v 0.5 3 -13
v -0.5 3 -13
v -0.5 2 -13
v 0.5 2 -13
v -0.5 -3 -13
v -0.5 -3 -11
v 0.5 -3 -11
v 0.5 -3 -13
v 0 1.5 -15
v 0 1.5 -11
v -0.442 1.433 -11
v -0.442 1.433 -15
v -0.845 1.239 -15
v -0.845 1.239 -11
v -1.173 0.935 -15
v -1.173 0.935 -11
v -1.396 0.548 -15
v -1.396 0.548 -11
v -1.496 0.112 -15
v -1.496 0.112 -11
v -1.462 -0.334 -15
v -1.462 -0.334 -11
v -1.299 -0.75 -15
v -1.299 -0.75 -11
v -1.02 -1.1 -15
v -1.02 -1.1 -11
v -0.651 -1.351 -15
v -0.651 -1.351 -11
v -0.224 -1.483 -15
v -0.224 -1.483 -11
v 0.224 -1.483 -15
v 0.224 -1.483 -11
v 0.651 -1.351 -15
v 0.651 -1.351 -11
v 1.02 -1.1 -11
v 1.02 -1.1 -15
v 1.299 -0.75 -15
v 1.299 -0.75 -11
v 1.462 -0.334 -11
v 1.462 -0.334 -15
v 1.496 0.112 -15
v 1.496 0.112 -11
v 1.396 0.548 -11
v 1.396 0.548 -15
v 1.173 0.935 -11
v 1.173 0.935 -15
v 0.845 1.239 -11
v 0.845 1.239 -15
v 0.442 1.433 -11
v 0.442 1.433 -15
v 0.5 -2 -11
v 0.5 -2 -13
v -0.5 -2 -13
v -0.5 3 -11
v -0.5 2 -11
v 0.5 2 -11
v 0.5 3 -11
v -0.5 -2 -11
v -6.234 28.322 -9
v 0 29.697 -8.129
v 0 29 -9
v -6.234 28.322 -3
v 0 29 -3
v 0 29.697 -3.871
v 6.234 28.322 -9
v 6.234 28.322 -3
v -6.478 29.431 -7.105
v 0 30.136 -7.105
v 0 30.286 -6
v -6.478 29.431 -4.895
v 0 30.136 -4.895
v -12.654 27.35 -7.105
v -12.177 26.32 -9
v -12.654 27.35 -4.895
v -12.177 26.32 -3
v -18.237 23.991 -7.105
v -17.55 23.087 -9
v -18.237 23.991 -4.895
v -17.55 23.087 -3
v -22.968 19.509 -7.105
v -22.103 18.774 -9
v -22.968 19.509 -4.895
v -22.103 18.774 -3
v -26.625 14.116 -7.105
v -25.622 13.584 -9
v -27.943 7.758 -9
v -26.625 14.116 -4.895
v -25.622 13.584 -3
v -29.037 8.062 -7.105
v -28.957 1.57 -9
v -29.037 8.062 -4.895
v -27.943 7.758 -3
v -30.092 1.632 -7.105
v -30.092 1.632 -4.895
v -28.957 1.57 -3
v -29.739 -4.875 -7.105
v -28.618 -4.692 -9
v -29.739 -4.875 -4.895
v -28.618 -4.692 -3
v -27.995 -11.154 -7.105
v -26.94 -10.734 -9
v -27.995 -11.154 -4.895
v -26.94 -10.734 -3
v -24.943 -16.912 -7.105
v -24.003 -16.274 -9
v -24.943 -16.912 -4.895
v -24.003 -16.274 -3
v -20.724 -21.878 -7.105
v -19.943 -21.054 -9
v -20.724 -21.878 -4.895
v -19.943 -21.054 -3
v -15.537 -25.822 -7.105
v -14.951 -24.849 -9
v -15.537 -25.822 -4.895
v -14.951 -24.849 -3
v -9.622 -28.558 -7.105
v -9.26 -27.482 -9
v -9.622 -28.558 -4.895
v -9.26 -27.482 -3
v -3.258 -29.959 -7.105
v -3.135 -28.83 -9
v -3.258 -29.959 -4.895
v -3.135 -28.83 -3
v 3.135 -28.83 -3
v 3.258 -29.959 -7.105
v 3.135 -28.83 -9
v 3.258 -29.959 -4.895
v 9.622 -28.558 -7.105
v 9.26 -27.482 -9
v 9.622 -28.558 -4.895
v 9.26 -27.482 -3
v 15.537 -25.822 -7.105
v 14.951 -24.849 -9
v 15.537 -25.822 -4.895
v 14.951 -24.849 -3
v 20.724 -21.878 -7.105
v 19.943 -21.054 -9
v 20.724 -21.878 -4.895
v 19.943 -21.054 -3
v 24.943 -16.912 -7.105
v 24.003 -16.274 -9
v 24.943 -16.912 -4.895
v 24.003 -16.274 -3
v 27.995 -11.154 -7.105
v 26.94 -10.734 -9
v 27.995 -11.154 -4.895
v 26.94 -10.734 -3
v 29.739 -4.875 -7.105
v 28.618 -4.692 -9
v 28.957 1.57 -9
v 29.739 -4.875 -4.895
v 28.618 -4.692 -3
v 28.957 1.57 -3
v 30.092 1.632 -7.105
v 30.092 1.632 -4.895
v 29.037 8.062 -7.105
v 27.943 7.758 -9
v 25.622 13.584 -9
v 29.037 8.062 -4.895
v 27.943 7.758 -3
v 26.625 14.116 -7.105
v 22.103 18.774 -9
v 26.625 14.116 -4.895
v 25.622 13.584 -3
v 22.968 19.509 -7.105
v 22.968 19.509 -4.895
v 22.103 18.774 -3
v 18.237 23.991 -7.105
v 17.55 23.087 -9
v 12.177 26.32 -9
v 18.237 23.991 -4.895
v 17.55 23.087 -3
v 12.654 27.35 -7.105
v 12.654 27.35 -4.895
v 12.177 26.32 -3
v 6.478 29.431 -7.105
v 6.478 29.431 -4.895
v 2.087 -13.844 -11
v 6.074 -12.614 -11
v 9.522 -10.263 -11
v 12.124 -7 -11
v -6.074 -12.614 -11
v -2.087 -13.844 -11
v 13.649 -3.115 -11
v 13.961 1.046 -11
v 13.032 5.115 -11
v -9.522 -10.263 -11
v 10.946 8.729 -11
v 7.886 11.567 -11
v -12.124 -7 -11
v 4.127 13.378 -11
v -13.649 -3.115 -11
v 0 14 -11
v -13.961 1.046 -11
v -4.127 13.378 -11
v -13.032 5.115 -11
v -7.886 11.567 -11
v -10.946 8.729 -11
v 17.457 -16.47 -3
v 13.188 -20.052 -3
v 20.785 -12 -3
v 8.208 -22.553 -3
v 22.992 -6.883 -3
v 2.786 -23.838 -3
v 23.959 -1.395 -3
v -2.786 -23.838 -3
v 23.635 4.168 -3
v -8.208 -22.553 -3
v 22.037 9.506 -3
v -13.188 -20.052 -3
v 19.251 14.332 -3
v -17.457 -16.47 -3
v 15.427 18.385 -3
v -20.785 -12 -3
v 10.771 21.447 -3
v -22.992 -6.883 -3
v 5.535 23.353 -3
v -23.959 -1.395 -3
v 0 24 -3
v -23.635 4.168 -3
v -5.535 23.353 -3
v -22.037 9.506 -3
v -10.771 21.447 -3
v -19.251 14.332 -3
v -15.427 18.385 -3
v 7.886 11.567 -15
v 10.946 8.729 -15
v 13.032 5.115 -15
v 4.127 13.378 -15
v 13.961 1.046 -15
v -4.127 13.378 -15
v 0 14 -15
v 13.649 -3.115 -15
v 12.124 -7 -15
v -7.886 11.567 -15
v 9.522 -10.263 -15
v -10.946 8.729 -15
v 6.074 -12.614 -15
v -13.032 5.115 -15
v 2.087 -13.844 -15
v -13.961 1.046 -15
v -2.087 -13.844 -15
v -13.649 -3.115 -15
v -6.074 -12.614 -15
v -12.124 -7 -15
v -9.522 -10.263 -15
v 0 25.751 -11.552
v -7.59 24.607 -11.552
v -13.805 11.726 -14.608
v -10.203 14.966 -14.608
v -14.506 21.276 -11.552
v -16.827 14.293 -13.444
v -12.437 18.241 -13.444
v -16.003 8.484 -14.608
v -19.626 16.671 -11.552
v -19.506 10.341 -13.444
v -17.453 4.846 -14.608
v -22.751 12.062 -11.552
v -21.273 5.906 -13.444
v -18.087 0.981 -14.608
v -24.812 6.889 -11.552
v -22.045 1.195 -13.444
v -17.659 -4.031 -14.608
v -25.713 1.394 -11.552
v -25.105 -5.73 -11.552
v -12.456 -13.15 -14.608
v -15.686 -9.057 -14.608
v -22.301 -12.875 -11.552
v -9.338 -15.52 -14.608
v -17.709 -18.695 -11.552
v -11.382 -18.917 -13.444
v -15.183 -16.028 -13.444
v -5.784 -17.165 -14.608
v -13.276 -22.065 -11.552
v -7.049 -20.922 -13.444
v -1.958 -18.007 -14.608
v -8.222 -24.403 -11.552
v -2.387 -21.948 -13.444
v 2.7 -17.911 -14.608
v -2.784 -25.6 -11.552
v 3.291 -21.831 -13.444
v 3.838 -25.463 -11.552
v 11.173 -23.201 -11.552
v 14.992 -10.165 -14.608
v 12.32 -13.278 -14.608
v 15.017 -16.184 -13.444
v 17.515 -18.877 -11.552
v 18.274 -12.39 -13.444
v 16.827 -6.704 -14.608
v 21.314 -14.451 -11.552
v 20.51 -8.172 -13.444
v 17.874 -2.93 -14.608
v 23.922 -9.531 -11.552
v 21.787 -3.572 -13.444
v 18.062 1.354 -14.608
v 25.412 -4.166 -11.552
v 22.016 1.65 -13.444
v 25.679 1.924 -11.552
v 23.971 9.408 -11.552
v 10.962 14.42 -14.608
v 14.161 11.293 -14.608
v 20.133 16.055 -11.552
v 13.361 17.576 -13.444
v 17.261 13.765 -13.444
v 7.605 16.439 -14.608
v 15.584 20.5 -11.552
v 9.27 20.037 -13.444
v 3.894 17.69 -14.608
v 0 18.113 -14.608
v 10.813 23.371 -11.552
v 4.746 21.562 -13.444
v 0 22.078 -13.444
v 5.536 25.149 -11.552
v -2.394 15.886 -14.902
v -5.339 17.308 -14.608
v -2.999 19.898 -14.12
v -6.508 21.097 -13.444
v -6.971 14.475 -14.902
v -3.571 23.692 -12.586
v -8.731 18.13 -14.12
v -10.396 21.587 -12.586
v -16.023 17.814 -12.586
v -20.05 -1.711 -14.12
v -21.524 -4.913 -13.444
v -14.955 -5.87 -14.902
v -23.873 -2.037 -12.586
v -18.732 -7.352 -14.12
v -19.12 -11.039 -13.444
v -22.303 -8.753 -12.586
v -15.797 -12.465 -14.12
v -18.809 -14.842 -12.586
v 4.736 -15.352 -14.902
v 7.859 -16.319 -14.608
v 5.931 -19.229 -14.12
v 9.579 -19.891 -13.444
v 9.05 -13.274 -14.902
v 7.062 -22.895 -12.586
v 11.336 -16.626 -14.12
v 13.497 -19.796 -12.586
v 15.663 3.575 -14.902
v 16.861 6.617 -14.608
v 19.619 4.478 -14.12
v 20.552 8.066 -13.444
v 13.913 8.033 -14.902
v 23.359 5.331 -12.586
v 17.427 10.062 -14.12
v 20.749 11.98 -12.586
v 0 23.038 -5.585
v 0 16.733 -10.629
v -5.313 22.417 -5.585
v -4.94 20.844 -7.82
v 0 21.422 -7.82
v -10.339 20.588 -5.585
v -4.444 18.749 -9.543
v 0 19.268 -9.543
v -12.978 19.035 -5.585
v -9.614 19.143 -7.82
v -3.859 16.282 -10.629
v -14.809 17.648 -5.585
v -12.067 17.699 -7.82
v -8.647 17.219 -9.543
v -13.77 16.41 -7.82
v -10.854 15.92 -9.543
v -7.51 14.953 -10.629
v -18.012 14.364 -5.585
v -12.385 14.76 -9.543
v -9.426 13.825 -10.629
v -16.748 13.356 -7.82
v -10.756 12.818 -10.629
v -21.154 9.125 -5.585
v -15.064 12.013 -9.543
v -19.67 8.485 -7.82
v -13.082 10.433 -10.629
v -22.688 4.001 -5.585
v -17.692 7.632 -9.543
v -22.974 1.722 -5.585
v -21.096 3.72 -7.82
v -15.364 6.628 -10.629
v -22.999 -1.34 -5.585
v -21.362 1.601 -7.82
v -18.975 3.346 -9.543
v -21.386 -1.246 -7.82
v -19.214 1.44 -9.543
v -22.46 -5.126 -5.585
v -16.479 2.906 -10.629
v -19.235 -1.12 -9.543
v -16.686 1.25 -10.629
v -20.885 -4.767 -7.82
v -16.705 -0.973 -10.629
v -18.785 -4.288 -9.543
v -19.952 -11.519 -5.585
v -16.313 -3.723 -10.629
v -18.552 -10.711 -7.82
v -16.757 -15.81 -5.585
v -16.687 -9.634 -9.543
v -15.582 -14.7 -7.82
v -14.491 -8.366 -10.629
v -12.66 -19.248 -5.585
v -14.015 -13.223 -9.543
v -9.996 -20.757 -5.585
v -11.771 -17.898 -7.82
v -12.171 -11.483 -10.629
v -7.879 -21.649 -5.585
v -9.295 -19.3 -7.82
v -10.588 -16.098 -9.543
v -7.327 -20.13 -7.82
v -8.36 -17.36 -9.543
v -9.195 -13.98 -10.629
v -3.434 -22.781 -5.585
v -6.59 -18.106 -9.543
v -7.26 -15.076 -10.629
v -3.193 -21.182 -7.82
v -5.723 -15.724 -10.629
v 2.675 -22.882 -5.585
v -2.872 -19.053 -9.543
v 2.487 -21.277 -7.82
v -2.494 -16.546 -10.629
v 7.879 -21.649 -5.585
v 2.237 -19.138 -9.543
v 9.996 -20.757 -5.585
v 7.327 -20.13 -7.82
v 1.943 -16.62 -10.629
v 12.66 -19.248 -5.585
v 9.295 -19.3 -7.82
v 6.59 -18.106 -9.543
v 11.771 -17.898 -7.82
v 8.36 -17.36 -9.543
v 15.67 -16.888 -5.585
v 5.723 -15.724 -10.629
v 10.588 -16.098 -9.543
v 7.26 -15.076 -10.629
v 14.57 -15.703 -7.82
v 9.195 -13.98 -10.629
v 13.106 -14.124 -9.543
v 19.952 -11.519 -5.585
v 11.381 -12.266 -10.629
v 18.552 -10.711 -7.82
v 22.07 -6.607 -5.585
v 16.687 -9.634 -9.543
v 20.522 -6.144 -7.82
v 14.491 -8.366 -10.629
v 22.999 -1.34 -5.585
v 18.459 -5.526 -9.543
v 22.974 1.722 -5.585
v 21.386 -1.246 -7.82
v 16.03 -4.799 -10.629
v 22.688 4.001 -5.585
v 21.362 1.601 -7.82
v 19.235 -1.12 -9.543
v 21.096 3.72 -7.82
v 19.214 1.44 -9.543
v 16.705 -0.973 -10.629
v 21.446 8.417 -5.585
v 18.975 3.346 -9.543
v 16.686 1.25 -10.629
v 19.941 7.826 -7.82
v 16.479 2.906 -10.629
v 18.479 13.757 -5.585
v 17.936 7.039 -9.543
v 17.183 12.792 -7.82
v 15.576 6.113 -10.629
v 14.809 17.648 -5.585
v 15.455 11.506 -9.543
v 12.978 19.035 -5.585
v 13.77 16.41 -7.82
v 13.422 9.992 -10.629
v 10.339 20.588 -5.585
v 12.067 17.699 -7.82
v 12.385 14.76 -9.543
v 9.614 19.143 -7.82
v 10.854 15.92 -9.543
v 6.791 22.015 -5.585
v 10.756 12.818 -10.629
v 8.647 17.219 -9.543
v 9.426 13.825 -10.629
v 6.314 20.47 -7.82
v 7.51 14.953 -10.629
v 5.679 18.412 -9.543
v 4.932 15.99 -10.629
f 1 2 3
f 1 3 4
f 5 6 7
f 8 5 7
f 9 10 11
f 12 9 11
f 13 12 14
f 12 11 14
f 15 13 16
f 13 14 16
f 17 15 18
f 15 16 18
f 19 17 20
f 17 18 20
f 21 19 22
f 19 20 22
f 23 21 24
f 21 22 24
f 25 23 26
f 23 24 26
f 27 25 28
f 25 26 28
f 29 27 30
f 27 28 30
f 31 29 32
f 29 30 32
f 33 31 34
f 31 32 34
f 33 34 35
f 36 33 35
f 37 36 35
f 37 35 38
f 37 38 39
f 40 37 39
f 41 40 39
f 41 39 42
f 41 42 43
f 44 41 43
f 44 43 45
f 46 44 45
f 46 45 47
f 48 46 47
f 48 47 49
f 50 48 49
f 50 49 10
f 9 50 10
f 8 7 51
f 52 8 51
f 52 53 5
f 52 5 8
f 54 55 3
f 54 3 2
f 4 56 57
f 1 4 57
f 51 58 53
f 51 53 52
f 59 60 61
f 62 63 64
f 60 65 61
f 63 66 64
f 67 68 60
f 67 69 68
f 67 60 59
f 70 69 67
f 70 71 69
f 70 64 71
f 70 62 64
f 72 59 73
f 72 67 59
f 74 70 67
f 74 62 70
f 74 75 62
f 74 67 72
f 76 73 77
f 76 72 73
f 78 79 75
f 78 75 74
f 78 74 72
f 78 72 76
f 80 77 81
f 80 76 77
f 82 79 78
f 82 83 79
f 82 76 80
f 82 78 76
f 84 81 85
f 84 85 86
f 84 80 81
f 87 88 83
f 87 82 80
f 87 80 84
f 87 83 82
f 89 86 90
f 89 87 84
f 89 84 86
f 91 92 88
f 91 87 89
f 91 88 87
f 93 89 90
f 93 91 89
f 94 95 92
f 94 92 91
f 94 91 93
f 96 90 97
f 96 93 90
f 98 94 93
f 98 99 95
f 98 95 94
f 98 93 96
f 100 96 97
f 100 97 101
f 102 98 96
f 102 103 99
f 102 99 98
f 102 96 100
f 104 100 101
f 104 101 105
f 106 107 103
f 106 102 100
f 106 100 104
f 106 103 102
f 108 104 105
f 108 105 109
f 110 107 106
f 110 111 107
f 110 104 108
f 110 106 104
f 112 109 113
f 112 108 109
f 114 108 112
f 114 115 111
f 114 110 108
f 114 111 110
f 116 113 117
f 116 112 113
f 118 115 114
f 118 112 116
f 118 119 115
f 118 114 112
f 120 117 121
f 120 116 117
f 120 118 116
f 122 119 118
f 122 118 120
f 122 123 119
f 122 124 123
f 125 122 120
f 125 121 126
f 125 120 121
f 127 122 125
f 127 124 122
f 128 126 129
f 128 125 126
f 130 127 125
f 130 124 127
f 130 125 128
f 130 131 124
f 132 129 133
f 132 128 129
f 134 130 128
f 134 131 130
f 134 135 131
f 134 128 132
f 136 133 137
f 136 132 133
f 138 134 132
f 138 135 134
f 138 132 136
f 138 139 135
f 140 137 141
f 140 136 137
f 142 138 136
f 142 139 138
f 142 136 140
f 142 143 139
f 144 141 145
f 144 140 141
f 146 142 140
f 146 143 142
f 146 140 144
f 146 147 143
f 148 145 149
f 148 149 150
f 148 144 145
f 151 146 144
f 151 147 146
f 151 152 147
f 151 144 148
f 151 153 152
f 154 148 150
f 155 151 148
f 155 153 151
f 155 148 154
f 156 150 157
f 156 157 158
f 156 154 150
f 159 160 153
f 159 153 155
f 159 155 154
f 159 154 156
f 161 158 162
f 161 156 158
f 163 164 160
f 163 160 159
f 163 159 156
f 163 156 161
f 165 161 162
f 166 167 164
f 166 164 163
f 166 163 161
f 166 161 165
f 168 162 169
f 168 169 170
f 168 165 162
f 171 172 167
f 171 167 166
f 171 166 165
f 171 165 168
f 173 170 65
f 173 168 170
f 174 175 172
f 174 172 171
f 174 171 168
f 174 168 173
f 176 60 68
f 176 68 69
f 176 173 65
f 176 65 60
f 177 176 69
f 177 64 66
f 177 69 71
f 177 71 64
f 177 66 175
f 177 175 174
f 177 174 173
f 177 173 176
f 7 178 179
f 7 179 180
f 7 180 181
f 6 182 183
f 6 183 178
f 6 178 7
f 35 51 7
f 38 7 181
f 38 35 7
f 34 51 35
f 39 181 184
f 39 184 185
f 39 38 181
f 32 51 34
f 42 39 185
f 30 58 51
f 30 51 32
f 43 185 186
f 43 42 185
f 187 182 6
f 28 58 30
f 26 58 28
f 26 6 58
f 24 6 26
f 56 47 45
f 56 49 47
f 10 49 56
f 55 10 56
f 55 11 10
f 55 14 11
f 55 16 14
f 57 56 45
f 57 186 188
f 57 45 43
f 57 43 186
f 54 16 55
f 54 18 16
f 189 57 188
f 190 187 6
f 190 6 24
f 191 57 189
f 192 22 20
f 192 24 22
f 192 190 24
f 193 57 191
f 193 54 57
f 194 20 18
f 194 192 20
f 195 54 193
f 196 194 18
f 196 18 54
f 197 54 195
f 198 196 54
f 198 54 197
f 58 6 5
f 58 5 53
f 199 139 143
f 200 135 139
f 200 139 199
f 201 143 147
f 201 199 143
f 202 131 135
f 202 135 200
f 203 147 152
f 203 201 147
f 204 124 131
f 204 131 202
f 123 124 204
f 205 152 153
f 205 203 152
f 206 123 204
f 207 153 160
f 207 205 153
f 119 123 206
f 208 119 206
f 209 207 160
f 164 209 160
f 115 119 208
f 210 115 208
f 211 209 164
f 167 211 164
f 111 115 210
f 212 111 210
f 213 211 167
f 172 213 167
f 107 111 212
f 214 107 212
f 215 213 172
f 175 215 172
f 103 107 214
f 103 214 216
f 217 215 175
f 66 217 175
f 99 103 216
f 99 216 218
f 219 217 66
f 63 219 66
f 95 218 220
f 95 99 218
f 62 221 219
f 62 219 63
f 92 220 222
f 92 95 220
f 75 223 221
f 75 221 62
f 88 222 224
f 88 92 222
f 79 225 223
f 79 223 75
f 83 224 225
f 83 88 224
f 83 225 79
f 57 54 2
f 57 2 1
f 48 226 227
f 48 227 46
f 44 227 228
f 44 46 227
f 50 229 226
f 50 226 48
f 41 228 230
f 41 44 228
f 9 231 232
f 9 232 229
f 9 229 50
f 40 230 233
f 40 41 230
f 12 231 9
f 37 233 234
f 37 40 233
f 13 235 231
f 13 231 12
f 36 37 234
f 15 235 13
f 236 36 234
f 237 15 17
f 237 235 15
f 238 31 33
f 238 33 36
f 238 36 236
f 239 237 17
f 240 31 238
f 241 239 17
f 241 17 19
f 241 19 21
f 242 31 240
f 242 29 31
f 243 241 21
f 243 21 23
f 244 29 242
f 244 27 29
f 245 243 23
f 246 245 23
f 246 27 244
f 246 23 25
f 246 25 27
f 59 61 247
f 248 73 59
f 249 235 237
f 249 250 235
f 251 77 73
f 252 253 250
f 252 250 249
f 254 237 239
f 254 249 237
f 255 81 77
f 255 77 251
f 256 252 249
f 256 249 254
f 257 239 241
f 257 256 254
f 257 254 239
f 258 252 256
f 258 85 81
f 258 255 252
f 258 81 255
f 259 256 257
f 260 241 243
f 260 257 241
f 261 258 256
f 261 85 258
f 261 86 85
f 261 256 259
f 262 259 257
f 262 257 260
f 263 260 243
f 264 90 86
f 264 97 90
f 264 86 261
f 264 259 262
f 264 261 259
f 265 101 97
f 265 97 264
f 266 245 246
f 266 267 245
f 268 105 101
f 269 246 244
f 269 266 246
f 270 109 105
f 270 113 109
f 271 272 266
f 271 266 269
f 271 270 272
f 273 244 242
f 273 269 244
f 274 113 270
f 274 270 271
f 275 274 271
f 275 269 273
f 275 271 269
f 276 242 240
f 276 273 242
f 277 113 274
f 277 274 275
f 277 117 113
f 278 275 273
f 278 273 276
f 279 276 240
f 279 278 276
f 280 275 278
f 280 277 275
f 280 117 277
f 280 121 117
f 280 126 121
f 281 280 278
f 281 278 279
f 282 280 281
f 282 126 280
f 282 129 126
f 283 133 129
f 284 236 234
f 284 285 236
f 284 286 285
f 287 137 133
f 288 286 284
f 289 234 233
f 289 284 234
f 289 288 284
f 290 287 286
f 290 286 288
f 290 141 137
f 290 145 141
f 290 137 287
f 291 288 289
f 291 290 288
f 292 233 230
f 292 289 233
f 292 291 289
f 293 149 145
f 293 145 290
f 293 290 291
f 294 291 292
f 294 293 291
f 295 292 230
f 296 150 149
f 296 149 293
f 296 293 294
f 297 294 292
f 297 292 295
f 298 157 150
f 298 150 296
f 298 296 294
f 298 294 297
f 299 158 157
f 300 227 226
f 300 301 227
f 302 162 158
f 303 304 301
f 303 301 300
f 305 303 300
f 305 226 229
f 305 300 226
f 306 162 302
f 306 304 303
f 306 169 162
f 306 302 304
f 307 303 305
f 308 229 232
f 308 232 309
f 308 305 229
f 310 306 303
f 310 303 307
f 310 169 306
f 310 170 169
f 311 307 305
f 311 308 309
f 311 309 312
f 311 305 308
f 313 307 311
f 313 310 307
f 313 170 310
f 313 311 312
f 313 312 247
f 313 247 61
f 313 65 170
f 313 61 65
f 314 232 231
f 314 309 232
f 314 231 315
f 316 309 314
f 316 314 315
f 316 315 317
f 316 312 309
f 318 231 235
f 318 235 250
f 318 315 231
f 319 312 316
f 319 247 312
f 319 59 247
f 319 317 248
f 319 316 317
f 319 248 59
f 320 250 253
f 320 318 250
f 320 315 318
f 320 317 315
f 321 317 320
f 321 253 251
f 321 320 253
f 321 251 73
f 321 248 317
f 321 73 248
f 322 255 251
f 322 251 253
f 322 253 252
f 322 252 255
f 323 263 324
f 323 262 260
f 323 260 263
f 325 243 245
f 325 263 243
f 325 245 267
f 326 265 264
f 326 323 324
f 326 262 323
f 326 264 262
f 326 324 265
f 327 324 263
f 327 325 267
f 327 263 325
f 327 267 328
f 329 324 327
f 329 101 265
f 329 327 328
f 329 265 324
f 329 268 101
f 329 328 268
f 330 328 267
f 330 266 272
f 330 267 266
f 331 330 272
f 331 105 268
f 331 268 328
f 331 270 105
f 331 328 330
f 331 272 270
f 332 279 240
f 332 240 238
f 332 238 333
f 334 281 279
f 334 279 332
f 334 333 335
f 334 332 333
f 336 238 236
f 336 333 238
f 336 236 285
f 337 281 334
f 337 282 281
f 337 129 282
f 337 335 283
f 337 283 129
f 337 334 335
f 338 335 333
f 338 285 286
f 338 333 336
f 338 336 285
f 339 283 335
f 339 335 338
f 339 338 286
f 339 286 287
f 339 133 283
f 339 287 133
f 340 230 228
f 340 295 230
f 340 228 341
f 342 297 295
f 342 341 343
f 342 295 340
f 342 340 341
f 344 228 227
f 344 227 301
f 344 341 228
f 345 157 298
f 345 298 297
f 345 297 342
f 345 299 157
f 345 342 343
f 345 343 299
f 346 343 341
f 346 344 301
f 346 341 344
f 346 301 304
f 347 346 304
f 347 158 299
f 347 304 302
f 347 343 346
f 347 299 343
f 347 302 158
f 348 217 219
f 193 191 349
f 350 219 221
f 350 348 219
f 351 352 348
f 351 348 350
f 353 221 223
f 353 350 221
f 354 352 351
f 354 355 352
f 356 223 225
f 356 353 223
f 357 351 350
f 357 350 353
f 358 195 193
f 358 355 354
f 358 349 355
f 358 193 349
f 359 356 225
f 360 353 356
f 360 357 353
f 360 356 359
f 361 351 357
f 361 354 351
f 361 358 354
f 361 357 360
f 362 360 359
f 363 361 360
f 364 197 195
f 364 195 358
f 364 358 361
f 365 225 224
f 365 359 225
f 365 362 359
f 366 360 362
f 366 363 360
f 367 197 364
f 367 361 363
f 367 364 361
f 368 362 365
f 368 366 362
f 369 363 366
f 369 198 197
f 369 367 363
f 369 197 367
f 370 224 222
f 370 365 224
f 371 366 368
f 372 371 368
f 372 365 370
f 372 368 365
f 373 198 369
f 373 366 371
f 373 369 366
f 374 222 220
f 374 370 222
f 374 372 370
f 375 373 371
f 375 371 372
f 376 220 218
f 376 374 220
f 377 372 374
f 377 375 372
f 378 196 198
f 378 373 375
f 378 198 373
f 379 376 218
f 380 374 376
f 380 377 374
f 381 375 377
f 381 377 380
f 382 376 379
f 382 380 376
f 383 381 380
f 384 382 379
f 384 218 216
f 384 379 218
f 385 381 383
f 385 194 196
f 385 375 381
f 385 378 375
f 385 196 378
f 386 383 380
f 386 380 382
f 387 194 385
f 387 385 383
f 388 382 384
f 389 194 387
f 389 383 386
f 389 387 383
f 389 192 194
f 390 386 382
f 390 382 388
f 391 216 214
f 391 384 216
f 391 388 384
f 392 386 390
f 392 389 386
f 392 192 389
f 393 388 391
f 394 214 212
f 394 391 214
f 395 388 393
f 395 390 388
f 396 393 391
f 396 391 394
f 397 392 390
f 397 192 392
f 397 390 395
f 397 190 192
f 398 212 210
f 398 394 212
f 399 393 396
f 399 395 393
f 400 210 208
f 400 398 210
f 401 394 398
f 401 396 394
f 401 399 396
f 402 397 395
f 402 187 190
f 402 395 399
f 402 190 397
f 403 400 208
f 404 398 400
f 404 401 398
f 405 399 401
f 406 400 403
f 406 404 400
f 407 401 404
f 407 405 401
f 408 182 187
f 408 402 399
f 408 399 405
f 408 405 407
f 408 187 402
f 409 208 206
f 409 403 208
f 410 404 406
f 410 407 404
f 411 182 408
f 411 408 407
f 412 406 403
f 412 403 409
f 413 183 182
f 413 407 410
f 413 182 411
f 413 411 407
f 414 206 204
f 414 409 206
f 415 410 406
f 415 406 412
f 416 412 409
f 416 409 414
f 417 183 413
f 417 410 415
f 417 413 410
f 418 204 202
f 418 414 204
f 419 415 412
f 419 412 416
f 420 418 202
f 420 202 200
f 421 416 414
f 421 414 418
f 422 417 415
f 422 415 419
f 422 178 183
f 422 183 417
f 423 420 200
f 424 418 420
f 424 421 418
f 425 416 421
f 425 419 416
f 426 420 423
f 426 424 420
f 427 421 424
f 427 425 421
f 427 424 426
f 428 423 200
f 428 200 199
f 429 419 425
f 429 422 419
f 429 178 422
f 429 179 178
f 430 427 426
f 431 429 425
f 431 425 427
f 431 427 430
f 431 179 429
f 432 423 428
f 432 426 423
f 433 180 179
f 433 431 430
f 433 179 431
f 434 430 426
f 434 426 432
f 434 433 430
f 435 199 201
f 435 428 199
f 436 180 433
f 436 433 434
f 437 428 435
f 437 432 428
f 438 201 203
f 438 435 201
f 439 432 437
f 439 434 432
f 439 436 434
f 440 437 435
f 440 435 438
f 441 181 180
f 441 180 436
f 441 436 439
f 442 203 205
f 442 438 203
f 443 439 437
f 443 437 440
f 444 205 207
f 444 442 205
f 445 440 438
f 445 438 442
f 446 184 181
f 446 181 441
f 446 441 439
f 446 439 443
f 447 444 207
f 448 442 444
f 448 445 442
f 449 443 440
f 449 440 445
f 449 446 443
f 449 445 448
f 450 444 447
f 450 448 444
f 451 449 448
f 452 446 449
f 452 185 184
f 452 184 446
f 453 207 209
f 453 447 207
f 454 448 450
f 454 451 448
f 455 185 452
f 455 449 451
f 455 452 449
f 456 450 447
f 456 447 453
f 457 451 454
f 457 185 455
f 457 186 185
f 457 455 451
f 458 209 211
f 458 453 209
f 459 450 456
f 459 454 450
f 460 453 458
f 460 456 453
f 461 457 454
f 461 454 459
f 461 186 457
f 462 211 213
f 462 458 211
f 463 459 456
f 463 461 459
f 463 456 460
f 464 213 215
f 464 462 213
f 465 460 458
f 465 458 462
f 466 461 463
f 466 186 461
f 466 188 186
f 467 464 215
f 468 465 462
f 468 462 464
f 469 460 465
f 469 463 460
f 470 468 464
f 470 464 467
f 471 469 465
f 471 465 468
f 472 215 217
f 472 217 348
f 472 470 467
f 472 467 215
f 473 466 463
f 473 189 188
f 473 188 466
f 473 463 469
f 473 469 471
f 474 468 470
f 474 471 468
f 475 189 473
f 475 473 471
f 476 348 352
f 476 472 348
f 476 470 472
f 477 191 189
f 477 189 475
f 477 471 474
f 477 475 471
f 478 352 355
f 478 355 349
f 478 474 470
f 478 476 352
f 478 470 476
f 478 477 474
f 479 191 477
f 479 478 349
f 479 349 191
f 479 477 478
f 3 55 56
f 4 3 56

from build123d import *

# Parameters (mm, degrees)
F_3_0MM_DOWEL_HOLE1_D           = 3
F_3_0MM_DOWEL_HOLE1_ON_FACE_2_D = 3
SKETCH5_W                       = 1
SKETCH5_H                       = 1
AXIAL_TRANSMISION_DEPTH         = 2


with BuildPart() as part:
    # Sketch1 → Revolve1 (revolve)
    with BuildSketch(Plane(origin=(0, 0, 0), x_dir=(0, 0, -1), z_dir=(1, 0, 0))):
        with BuildLine():
            Line((15, 0), (15, 14))
            ThreePointArc((15, 14), (13.444368027, 22.077747211), (9, 29))
            ThreePointArc((9, 29), (6, 30.285714286), (3, 29))
            Line((3, 29), (3, 24))
            ThreePointArc((3, 24), (8.753905297, 20.403124237), (11, 14))
            Line((11, 14), (11, 0))
            Line((11, 0), (15, 0))
        make_face()
    revolve(axis=Axis((0, 0, -15), (0, 0, 1)))

    # Ø3.0mm Dowel Hole1 (through all)
    with Locations(Plane(origin=(0, 0, -15), x_dir=(0, -1, 0), z_dir=(0, 0, -1))):
        with Locations((0, 0)):
            Hole(F_3_0MM_DOWEL_HOLE1_D / 2)

    # Ø3.0mm Dowel Hole1 on face 2 (through all)
    with Locations(Plane(origin=(0, 0, 0), x_dir=(0, -1, 0), z_dir=(0, 0, -1))):
        with Locations((0, 0)):
            Hole(F_3_0MM_DOWEL_HOLE1_ON_FACE_2_D / 2)

    # Sketch5 → Axial_Transmision (cut)
    with BuildSketch(Plane.XY.offset(-11)):
        with Locations((0, 2.5)):
            Rectangle(SKETCH5_W, SKETCH5_H)
        with Locations((0, -2.5)):
            Rectangle(SKETCH5_W, SKETCH5_H)
    extrude(amount=-AXIAL_TRANSMISION_DEPTH, mode=Mode.SUBTRACT)


solid = part.part
